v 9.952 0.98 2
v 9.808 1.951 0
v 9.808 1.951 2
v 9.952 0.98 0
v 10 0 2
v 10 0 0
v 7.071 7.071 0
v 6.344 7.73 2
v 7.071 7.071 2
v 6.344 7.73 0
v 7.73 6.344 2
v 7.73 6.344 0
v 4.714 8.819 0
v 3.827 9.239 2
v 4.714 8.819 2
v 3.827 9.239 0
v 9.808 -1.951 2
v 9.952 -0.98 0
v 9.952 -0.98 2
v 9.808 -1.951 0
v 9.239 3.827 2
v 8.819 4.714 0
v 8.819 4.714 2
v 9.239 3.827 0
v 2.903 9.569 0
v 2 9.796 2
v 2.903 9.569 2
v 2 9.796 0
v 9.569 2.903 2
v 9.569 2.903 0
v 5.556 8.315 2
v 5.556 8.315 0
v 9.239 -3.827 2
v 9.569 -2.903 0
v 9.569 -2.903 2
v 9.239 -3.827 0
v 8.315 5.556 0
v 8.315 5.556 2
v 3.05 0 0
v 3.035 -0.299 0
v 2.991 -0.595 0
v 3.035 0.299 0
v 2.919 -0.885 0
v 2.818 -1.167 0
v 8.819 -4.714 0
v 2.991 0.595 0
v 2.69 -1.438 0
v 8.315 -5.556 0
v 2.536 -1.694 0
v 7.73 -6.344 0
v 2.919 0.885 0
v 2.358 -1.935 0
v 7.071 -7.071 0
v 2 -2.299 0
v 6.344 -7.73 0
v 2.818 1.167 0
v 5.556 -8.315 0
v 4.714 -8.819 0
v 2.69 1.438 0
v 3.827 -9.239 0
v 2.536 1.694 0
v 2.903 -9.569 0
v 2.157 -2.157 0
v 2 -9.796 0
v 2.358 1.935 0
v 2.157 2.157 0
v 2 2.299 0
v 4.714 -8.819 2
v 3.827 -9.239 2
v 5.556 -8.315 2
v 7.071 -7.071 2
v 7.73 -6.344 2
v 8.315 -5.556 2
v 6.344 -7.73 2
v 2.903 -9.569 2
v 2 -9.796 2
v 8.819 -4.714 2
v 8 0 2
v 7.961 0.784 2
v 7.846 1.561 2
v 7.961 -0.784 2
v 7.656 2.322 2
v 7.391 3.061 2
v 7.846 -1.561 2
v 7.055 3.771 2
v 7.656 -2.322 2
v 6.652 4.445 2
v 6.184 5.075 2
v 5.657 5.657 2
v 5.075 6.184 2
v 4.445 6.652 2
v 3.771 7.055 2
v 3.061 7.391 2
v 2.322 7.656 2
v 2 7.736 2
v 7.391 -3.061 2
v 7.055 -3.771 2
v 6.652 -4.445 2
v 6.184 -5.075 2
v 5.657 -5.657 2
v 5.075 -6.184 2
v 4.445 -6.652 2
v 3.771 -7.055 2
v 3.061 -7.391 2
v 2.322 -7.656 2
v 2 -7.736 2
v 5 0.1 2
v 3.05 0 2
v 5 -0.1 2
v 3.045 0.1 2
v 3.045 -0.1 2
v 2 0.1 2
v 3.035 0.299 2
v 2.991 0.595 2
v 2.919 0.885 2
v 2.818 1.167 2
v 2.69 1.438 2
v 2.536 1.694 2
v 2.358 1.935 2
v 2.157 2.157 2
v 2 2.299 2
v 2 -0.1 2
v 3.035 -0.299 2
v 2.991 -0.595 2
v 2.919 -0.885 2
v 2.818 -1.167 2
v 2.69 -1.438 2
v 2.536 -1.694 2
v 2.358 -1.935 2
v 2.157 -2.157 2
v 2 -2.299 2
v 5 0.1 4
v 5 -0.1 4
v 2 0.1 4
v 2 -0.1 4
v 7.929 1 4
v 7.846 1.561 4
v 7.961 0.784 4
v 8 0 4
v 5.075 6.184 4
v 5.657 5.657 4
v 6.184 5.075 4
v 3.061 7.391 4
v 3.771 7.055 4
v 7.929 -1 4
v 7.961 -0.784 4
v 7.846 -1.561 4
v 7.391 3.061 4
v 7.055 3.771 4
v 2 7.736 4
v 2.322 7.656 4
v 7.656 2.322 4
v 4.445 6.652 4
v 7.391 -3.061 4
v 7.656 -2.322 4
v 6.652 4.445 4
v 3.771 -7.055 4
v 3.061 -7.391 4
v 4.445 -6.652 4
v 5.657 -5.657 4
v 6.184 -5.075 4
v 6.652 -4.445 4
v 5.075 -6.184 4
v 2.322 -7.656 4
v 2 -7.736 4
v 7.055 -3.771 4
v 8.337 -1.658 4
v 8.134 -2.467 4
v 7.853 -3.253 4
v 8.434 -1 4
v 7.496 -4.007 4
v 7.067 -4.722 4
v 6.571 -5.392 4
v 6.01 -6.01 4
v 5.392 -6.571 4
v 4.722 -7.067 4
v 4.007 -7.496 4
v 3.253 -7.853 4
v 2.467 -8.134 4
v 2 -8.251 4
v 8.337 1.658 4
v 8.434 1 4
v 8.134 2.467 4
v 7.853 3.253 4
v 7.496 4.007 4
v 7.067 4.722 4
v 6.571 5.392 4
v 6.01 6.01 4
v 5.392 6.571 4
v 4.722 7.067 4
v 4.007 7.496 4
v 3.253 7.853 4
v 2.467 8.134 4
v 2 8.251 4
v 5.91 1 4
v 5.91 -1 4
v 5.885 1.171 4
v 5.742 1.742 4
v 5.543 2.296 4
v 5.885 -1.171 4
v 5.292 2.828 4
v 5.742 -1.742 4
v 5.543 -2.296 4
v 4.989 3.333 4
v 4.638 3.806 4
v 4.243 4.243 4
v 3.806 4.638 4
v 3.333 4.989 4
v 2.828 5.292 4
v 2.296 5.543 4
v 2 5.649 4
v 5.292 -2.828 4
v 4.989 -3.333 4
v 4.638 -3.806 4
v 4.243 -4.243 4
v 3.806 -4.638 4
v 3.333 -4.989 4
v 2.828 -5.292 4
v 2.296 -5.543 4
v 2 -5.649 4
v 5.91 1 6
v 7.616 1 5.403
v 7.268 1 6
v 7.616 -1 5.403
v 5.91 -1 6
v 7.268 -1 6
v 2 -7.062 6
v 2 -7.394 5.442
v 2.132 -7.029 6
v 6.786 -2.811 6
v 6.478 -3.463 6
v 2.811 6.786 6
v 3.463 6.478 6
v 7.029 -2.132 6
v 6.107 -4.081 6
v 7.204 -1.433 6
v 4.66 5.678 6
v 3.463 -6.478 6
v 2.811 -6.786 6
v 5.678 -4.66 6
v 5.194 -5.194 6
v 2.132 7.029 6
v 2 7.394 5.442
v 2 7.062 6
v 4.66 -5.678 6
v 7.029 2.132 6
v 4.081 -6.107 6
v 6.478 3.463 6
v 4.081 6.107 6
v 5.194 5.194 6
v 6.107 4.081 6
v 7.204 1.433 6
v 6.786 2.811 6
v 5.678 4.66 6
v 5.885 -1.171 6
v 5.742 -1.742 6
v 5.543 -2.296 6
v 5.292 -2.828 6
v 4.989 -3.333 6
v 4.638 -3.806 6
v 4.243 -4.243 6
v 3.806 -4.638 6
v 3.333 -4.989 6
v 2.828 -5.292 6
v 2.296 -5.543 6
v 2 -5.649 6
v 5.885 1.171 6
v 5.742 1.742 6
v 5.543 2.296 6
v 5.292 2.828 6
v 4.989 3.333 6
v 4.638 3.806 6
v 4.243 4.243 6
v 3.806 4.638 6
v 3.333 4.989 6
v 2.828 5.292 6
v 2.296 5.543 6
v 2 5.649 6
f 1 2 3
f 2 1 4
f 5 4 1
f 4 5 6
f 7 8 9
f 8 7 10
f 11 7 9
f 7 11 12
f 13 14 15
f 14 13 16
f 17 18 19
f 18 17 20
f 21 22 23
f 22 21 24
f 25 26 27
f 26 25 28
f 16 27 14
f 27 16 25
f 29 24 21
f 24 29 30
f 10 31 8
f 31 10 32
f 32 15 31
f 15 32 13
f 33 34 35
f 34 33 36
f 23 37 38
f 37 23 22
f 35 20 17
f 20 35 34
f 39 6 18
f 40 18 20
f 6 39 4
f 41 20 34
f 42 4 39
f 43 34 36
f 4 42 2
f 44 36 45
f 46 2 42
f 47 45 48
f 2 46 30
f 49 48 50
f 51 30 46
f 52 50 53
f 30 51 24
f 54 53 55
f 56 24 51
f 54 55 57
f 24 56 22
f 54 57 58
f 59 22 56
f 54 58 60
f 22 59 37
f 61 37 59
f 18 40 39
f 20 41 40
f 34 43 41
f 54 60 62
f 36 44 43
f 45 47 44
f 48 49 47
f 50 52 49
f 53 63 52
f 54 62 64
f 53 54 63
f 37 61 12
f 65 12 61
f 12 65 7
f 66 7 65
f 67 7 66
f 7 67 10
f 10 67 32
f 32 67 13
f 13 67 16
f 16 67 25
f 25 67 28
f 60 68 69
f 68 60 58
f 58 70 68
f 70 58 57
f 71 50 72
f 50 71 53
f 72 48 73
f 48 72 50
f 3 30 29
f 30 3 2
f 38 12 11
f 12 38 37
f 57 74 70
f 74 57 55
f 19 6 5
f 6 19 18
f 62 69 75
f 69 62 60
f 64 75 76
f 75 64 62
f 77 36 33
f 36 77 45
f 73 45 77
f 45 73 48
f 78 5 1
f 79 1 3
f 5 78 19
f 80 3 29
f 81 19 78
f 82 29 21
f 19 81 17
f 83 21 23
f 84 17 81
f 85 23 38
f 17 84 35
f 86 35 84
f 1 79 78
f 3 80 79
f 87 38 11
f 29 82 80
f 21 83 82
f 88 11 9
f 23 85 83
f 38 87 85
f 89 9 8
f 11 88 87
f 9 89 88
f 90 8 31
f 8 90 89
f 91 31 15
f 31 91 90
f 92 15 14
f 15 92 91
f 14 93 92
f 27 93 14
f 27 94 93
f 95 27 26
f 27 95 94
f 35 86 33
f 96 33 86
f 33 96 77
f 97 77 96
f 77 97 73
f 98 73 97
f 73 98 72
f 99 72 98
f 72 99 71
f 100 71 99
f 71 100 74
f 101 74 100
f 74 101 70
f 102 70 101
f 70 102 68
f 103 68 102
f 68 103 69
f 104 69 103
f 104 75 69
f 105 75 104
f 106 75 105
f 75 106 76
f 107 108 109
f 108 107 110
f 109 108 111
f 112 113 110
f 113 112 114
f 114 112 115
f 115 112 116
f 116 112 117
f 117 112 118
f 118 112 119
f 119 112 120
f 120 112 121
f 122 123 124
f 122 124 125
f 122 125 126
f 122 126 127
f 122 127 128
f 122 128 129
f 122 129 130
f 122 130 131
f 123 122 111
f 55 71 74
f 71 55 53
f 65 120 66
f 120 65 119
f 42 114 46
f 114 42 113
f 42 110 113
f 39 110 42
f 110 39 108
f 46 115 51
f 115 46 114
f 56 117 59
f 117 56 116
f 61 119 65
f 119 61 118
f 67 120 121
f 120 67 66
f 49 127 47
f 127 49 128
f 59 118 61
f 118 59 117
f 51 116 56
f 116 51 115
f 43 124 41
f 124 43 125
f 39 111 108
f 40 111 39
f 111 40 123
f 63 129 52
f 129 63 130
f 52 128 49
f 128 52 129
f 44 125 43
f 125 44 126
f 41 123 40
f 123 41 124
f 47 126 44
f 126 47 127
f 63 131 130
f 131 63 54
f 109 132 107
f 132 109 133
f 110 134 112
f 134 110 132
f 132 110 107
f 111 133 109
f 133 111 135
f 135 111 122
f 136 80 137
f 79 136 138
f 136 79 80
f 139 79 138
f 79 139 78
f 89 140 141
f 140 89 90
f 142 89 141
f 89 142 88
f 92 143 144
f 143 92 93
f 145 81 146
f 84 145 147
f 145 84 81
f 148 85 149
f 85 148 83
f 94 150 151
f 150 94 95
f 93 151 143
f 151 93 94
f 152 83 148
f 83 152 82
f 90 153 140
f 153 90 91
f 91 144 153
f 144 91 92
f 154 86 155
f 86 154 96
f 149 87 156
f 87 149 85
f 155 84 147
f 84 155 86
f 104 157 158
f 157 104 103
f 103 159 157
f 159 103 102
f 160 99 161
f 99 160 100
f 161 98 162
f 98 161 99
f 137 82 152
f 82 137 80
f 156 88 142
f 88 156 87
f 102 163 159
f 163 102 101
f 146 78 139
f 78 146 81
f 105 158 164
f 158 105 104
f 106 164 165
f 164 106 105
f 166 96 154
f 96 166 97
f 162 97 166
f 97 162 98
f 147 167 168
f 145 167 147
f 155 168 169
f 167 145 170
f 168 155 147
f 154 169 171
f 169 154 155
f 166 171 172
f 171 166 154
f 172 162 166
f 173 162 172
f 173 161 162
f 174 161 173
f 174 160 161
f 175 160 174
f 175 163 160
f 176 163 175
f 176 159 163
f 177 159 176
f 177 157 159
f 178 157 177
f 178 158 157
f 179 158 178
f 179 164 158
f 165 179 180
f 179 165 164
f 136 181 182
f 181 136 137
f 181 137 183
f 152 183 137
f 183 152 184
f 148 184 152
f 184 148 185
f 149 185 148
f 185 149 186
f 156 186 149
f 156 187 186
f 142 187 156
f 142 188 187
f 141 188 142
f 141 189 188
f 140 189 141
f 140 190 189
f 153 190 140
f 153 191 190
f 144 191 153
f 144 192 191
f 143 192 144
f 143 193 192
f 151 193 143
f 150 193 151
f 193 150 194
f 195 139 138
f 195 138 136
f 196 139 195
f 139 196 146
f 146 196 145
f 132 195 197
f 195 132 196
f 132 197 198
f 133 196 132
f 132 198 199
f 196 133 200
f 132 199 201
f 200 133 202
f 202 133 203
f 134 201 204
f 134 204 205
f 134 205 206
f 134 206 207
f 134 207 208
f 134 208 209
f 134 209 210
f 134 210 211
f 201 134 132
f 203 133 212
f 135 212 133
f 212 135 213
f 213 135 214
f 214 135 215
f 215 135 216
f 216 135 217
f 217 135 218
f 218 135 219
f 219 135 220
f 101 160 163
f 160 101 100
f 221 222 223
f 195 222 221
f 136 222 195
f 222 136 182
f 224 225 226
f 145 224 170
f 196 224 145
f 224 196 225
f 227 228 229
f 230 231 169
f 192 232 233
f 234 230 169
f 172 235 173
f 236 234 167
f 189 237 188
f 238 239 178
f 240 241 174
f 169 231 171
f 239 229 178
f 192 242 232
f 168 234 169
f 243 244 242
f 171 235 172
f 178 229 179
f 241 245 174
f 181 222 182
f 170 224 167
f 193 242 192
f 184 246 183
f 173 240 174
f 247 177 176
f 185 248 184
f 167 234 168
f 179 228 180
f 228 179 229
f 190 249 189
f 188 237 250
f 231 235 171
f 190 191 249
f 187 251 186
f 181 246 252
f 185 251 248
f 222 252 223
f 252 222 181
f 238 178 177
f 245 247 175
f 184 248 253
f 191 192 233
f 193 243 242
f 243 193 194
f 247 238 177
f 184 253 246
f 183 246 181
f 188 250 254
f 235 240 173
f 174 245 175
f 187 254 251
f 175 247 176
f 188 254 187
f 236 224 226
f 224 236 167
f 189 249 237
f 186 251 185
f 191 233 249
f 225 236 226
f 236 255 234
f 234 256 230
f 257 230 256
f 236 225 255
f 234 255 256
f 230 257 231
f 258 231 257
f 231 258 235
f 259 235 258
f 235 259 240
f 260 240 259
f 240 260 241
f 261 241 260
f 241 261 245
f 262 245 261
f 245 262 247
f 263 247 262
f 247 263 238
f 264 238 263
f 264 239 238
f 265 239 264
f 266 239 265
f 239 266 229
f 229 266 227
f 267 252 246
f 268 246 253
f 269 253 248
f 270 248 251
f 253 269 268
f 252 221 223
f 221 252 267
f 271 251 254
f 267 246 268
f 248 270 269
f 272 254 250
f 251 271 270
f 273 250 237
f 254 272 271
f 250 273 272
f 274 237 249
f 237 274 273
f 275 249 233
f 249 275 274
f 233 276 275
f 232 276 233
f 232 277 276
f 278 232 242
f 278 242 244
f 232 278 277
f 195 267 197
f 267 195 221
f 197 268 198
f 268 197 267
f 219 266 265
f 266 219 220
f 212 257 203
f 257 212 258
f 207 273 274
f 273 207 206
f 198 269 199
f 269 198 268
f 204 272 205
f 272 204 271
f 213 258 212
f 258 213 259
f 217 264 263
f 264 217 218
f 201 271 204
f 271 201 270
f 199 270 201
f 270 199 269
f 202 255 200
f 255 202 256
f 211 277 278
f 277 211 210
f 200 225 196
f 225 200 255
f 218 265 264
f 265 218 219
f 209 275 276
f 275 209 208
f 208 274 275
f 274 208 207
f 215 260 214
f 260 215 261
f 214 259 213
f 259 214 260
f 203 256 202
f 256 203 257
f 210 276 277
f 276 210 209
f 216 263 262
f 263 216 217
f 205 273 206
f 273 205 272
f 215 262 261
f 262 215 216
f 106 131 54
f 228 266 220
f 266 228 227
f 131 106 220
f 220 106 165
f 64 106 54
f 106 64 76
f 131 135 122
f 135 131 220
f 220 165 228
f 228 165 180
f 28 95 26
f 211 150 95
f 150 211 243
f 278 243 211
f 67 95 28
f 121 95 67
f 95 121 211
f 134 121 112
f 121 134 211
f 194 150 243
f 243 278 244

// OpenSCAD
// file: common.scad
// V2 Slit-Valve Liquid Bait Station — Shared Parameters
// Rigid reservoir drops into an open tray bait station.
// A central push-pin spreads the TPU slit valve open on bayonet lock.

// ── Performance Settings ──────────────────────────────────────────
preview = false; // true = faster preview; false = full detail render
crosssection_view = true;  // cut the model along a plane to inspect internals
crosssection_axis = "x";   // axis: "x", "y", or "z"
crosssection_pos  = 2;     // position (mm) along the chosen axis

$fn = preview ? 32 : 64;

// ── General ───────────────────────────────────────────────────────
wall      = 2;     // shell wall thickness (mm)
clearance = 0.2;   // general fit clearance for mating parts (mm)

// ── Reservoir ─────────────────────────────────────────────────────
reservoir_od       = 82;                          // outer diameter (mm)
reservoir_height   = 30;                          // total height (mm)
reservoir_id       = reservoir_od - wall * 2;     // 78mm internal diameter
reservoir_cavity_h = reservoir_height - wall * 2; // 26mm internal height
// Volume: π × 39² × 26 ≈ 124ml ≈ 4.2oz (slightly less with dome)

// ── TPU Slit Valve ────────────────────────────────────────────────
valve_disk_od  = 16;                        // disk outer diameter (mm)
valve_bore_id  = valve_disk_od;             // snug sliding fit — FDM shrinkage holds it
valve_disk_h   = wall;                      // same as floor thickness — flush inside
valve_flange_od = valve_disk_od + 4;        // flange: 2mm larger radius — stop collar
valve_flange_h  = 2;                        // flange height (mm) — prevents push-through
valve_retainer_od = valve_disk_od + 1;       // top retention disk OD — just past bore edge
valve_retainer_id = valve_disk_od - 4;       // top retention disk ID — 2mm lip inward
valve_retainer_h  = valve_flange_h;          // same thickness as bottom flange
slit_width    = 0.2;  // effectively touching — prints closed, pin forces open
slit_length   = 10;   // each arm of the X-slit (mm)

// ── Station ───────────────────────────────────────────────────────
station_od     = 90;   // outer diameter (mm)
station_floor  = 5;    // floor thickness — deep enough for torus groove
station_id     = reservoir_od + clearance * 2;  // 82.4mm bore for reservoir

// ── Torus Groove (full-circle ring channel in tray floor) ─────────
torus_groove_dia = 6;  // cross-section diameter — semicircle profile in floor
torus_groove_r   = station_id / 2 - torus_groove_dia / 2;  // 38.2mm center radius
// Outer edge of groove touches the bore wall for direct ant access.
torus_hump_r     = torus_groove_r - torus_groove_dia;      // 32.2mm — hump ring just inside groove
torus_inner_r    = torus_hump_r - torus_groove_dia;        // 26.2mm — inner groove just inside hump

// Reservoir sits on top of the hump torus
reservoir_seat   = station_floor + torus_groove_dia / 2 + clearance;  // 8.2mm — just above hump top
station_height   = 18;   // total height — raised 3mm for higher reservoir seat

// ── Push Pin (station center, spreads valve slits on lock) ────────
pin_dia         = 6;   // pin diameter (mm) — smaller than slit_length for proper spread
pin_cone_h      = 2;   // tapered tip height for smooth slit entry
pin_blunt_dia   = 2;   // flat cap diameter at cone tip to blunt the point
pin_penetration = 2;   // mm past valve top when fully locked

pin_channel_dia = 2;   // internal fluid channel diameter (mm)

// Computed pin heights (from station z=0)
// Cone starts where the retention flange ends (flange top = reservoir_seat)
pin_cyl_top = reservoir_seat;                  // 8.2mm — cone begins at flange top
pin_top     = pin_cyl_top + pin_cone_h;        // 11.2mm — cone tip

// ── Bayonet Twist-Lock ────────────────────────────────────────────
// Lugs on reservoir outer wall; straight vertical entry slots in station bore.
// Reservoir drops in, then twists clockwise (righty-tighty) to lock.
bayonet_count    = 3;    // number of lugs, evenly spaced
bayonet_lug_w    = 3;    // lug circumferential width (mm)
bayonet_lug_h    = 2;    // lug height (mm)
bayonet_lug_d    = 1.5;  // lug radial protrusion from reservoir wall (mm)
bayonet_rotation = 30;   // degrees to twist for lock
bayonet_drop     = 5;    // mm the reservoir drops through vertical slot (pin engagement travel)
bayonet_lug_z    = 2;    // lug bottom position from reservoir bottom (mm)

// Computed lug z-positions in station coordinates
lug_z_locked   = reservoir_seat + bayonet_lug_z;                // 10mm
lug_z_unlocked = reservoir_seat + bayonet_drop + bayonet_lug_z; // 15mm
// Unlocked (resting above slot): pin tip below valve — no contact.
// Locked (dropped + twisted CW):  pin pushes past valve top — full spread.

// ── Guard Holes (ant access through outer wall at groove level) ───
guard_hole_dia   = 3.2;  // hole diameter — ants only
guard_hole_count = 12;   // number around circumference
guard_hole_z     = station_floor - torus_groove_dia / 3;  // 3mm — lower groove zone

// ── Drain Channels (radial grooves from pin base to torus groove) ─
drain_count      = 4;   // channels at 90° intervals
drain_width      = 3;   // channel width (mm)
drain_depth      = 2;   // channel depth below floor surface (mm)
central_pocket_r = pin_dia / 2 + 3;  // 6mm — annular pool around pin base

// ── Ant Tunnels (half-pipe arches over hump, flush with reservoir bottom) ──
ant_tunnel_count  = guard_hole_count;              // one tunnel per guard hole
ant_tunnel_r_out  = 6;                             // outer half-cylinder radius
ant_tunnel_r_in   = 4;                             // inner cutout radius (passage)
ant_tunnel_length = reservoir_id / 2 - (torus_inner_r - torus_groove_dia / 2); // radial span: inner edge of inner groove to reservoir inner wall

// ── Reservoir Skirt (flush outer shell when assembled) ───────────
// Extends the reservoir OD to match station OD above the station rim.
// In reservoir-local coords, starts where the station wall ends.
skirt_od       = station_od;                                    // 90mm — flush with station
skirt_id       = reservoir_od;                                  // 82mm — wraps around reservoir shell
skirt_z_start  = station_height - reservoir_seat;               // 9.8mm from reservoir bottom
skirt_height   = reservoir_height - skirt_z_start;              // 20.2mm — up to reservoir top

// ── Internal Struts (reservoir ceiling bridging + anti-slosh) ─────
strut_count     = 6;   // radial struts evenly spaced
strut_thickness = 1;   // strut wall thickness (mm)
strut_gap       = valve_bore_id / 2 + 2;  // stop short of valve bore center

// ── Utility Modules ───────────────────────────────────────────────

module render_if_needed() {
    if (!preview) render() children();
    else children();
}

module crosssection(extent) {
    if (!crosssection_view) {
        children();
    } else {
        intersection() {
            children();
            hs = extent;
            if (crosssection_axis == "x")
                translate([crosssection_pos, -hs, -hs]) cube([hs*2, hs*2, hs*2]);
            if (crosssection_axis == "y")
                translate([-hs, crosssection_pos, -hs]) cube([hs*2, hs*2, hs*2]);
            if (crosssection_axis == "z")
                translate([-hs, -hs, crosssection_pos]) cube([hs*2, hs*2, hs*2]);
        }
    }
}
// main file
// Slit Valve for V2 Liquid Bait Station — Print in TPU 90A (or 80A for easier flex)
// Slides into the reservoir bore; flange collar sits on the outside of the floor
// and prevents the valve from being pushed into the reservoir.
// Slits are touching at rest; the station's push-pin spreads them open.
// After printing, slits can be deepened with a razor blade if needed.

include <common.scad>

module slit_valve() {
    slit_valve_flange();
    slit_valve_disk();
    slit_valve_barb();
}

// Stop-collar flange — wider cylinder that sits on the reservoir floor
// and prevents the valve from being pushed into the reservoir
module slit_valve_flange() {
    difference() {
        cylinder(h = valve_flange_h, d = valve_flange_od);
        // Pin clearance hole — 0.2mm larger radius than pin
        translate([0, 0, -0.5])
            cylinder(h = valve_flange_h + 1, d = pin_dia + 0.1);
    }
}

// Main disk — slides snugly into the reservoir bore
module slit_valve_disk() {
    difference() {
        translate([0, 0, valve_flange_h])
            cylinder(h = valve_disk_h, d = valve_disk_od);

        // X-shaped cross-slit through full disk thickness
        // Prints effectively closed at 0.2mm — pin forces petals apart
        for (angle = [0, 90])
            rotate([0, 0, angle])
                translate([-slit_length / 2, -slit_width / 2, valve_flange_h - 0.5])
                    cube([slit_length, slit_width, valve_disk_h + 1]);
    }
}

// ── Top Retention Disk ────────────────────────────────────────────
// Thin ring on top of the disk — slightly wider than the bore so it
// catches on the inside of the reservoir floor. TPU flexes through
// the bore on insertion, then springs back to retain. Bottom flange
// stops push-through; this ring stops pull-out.
module slit_valve_barb() {
    taper_inset = valve_retainer_h * tan(30) * 2;  // OD reduction over height
    translate([0, 0, valve_flange_h + valve_disk_h])
        difference() {
            cylinder(h = valve_retainer_h,
                     d1 = valve_retainer_od,
                     d2 = valve_retainer_od - taper_inset);
            translate([0, 0, -0.5])
                cylinder(h = valve_retainer_h + 1, d = valve_retainer_id);
            // Flow slots — 2mm gaps at 90° intervals
            for (i = [0 : 3])
                rotate([0, 0, i * 90])
                    translate([-1, -valve_retainer_od / 2, -0.5])
                        cube([2, valve_retainer_od, valve_retainer_h + 1]);
        }
}

// ── Render ────────────────────────────────────────────────────────
crosssection(valve_flange_od) slit_valve();
